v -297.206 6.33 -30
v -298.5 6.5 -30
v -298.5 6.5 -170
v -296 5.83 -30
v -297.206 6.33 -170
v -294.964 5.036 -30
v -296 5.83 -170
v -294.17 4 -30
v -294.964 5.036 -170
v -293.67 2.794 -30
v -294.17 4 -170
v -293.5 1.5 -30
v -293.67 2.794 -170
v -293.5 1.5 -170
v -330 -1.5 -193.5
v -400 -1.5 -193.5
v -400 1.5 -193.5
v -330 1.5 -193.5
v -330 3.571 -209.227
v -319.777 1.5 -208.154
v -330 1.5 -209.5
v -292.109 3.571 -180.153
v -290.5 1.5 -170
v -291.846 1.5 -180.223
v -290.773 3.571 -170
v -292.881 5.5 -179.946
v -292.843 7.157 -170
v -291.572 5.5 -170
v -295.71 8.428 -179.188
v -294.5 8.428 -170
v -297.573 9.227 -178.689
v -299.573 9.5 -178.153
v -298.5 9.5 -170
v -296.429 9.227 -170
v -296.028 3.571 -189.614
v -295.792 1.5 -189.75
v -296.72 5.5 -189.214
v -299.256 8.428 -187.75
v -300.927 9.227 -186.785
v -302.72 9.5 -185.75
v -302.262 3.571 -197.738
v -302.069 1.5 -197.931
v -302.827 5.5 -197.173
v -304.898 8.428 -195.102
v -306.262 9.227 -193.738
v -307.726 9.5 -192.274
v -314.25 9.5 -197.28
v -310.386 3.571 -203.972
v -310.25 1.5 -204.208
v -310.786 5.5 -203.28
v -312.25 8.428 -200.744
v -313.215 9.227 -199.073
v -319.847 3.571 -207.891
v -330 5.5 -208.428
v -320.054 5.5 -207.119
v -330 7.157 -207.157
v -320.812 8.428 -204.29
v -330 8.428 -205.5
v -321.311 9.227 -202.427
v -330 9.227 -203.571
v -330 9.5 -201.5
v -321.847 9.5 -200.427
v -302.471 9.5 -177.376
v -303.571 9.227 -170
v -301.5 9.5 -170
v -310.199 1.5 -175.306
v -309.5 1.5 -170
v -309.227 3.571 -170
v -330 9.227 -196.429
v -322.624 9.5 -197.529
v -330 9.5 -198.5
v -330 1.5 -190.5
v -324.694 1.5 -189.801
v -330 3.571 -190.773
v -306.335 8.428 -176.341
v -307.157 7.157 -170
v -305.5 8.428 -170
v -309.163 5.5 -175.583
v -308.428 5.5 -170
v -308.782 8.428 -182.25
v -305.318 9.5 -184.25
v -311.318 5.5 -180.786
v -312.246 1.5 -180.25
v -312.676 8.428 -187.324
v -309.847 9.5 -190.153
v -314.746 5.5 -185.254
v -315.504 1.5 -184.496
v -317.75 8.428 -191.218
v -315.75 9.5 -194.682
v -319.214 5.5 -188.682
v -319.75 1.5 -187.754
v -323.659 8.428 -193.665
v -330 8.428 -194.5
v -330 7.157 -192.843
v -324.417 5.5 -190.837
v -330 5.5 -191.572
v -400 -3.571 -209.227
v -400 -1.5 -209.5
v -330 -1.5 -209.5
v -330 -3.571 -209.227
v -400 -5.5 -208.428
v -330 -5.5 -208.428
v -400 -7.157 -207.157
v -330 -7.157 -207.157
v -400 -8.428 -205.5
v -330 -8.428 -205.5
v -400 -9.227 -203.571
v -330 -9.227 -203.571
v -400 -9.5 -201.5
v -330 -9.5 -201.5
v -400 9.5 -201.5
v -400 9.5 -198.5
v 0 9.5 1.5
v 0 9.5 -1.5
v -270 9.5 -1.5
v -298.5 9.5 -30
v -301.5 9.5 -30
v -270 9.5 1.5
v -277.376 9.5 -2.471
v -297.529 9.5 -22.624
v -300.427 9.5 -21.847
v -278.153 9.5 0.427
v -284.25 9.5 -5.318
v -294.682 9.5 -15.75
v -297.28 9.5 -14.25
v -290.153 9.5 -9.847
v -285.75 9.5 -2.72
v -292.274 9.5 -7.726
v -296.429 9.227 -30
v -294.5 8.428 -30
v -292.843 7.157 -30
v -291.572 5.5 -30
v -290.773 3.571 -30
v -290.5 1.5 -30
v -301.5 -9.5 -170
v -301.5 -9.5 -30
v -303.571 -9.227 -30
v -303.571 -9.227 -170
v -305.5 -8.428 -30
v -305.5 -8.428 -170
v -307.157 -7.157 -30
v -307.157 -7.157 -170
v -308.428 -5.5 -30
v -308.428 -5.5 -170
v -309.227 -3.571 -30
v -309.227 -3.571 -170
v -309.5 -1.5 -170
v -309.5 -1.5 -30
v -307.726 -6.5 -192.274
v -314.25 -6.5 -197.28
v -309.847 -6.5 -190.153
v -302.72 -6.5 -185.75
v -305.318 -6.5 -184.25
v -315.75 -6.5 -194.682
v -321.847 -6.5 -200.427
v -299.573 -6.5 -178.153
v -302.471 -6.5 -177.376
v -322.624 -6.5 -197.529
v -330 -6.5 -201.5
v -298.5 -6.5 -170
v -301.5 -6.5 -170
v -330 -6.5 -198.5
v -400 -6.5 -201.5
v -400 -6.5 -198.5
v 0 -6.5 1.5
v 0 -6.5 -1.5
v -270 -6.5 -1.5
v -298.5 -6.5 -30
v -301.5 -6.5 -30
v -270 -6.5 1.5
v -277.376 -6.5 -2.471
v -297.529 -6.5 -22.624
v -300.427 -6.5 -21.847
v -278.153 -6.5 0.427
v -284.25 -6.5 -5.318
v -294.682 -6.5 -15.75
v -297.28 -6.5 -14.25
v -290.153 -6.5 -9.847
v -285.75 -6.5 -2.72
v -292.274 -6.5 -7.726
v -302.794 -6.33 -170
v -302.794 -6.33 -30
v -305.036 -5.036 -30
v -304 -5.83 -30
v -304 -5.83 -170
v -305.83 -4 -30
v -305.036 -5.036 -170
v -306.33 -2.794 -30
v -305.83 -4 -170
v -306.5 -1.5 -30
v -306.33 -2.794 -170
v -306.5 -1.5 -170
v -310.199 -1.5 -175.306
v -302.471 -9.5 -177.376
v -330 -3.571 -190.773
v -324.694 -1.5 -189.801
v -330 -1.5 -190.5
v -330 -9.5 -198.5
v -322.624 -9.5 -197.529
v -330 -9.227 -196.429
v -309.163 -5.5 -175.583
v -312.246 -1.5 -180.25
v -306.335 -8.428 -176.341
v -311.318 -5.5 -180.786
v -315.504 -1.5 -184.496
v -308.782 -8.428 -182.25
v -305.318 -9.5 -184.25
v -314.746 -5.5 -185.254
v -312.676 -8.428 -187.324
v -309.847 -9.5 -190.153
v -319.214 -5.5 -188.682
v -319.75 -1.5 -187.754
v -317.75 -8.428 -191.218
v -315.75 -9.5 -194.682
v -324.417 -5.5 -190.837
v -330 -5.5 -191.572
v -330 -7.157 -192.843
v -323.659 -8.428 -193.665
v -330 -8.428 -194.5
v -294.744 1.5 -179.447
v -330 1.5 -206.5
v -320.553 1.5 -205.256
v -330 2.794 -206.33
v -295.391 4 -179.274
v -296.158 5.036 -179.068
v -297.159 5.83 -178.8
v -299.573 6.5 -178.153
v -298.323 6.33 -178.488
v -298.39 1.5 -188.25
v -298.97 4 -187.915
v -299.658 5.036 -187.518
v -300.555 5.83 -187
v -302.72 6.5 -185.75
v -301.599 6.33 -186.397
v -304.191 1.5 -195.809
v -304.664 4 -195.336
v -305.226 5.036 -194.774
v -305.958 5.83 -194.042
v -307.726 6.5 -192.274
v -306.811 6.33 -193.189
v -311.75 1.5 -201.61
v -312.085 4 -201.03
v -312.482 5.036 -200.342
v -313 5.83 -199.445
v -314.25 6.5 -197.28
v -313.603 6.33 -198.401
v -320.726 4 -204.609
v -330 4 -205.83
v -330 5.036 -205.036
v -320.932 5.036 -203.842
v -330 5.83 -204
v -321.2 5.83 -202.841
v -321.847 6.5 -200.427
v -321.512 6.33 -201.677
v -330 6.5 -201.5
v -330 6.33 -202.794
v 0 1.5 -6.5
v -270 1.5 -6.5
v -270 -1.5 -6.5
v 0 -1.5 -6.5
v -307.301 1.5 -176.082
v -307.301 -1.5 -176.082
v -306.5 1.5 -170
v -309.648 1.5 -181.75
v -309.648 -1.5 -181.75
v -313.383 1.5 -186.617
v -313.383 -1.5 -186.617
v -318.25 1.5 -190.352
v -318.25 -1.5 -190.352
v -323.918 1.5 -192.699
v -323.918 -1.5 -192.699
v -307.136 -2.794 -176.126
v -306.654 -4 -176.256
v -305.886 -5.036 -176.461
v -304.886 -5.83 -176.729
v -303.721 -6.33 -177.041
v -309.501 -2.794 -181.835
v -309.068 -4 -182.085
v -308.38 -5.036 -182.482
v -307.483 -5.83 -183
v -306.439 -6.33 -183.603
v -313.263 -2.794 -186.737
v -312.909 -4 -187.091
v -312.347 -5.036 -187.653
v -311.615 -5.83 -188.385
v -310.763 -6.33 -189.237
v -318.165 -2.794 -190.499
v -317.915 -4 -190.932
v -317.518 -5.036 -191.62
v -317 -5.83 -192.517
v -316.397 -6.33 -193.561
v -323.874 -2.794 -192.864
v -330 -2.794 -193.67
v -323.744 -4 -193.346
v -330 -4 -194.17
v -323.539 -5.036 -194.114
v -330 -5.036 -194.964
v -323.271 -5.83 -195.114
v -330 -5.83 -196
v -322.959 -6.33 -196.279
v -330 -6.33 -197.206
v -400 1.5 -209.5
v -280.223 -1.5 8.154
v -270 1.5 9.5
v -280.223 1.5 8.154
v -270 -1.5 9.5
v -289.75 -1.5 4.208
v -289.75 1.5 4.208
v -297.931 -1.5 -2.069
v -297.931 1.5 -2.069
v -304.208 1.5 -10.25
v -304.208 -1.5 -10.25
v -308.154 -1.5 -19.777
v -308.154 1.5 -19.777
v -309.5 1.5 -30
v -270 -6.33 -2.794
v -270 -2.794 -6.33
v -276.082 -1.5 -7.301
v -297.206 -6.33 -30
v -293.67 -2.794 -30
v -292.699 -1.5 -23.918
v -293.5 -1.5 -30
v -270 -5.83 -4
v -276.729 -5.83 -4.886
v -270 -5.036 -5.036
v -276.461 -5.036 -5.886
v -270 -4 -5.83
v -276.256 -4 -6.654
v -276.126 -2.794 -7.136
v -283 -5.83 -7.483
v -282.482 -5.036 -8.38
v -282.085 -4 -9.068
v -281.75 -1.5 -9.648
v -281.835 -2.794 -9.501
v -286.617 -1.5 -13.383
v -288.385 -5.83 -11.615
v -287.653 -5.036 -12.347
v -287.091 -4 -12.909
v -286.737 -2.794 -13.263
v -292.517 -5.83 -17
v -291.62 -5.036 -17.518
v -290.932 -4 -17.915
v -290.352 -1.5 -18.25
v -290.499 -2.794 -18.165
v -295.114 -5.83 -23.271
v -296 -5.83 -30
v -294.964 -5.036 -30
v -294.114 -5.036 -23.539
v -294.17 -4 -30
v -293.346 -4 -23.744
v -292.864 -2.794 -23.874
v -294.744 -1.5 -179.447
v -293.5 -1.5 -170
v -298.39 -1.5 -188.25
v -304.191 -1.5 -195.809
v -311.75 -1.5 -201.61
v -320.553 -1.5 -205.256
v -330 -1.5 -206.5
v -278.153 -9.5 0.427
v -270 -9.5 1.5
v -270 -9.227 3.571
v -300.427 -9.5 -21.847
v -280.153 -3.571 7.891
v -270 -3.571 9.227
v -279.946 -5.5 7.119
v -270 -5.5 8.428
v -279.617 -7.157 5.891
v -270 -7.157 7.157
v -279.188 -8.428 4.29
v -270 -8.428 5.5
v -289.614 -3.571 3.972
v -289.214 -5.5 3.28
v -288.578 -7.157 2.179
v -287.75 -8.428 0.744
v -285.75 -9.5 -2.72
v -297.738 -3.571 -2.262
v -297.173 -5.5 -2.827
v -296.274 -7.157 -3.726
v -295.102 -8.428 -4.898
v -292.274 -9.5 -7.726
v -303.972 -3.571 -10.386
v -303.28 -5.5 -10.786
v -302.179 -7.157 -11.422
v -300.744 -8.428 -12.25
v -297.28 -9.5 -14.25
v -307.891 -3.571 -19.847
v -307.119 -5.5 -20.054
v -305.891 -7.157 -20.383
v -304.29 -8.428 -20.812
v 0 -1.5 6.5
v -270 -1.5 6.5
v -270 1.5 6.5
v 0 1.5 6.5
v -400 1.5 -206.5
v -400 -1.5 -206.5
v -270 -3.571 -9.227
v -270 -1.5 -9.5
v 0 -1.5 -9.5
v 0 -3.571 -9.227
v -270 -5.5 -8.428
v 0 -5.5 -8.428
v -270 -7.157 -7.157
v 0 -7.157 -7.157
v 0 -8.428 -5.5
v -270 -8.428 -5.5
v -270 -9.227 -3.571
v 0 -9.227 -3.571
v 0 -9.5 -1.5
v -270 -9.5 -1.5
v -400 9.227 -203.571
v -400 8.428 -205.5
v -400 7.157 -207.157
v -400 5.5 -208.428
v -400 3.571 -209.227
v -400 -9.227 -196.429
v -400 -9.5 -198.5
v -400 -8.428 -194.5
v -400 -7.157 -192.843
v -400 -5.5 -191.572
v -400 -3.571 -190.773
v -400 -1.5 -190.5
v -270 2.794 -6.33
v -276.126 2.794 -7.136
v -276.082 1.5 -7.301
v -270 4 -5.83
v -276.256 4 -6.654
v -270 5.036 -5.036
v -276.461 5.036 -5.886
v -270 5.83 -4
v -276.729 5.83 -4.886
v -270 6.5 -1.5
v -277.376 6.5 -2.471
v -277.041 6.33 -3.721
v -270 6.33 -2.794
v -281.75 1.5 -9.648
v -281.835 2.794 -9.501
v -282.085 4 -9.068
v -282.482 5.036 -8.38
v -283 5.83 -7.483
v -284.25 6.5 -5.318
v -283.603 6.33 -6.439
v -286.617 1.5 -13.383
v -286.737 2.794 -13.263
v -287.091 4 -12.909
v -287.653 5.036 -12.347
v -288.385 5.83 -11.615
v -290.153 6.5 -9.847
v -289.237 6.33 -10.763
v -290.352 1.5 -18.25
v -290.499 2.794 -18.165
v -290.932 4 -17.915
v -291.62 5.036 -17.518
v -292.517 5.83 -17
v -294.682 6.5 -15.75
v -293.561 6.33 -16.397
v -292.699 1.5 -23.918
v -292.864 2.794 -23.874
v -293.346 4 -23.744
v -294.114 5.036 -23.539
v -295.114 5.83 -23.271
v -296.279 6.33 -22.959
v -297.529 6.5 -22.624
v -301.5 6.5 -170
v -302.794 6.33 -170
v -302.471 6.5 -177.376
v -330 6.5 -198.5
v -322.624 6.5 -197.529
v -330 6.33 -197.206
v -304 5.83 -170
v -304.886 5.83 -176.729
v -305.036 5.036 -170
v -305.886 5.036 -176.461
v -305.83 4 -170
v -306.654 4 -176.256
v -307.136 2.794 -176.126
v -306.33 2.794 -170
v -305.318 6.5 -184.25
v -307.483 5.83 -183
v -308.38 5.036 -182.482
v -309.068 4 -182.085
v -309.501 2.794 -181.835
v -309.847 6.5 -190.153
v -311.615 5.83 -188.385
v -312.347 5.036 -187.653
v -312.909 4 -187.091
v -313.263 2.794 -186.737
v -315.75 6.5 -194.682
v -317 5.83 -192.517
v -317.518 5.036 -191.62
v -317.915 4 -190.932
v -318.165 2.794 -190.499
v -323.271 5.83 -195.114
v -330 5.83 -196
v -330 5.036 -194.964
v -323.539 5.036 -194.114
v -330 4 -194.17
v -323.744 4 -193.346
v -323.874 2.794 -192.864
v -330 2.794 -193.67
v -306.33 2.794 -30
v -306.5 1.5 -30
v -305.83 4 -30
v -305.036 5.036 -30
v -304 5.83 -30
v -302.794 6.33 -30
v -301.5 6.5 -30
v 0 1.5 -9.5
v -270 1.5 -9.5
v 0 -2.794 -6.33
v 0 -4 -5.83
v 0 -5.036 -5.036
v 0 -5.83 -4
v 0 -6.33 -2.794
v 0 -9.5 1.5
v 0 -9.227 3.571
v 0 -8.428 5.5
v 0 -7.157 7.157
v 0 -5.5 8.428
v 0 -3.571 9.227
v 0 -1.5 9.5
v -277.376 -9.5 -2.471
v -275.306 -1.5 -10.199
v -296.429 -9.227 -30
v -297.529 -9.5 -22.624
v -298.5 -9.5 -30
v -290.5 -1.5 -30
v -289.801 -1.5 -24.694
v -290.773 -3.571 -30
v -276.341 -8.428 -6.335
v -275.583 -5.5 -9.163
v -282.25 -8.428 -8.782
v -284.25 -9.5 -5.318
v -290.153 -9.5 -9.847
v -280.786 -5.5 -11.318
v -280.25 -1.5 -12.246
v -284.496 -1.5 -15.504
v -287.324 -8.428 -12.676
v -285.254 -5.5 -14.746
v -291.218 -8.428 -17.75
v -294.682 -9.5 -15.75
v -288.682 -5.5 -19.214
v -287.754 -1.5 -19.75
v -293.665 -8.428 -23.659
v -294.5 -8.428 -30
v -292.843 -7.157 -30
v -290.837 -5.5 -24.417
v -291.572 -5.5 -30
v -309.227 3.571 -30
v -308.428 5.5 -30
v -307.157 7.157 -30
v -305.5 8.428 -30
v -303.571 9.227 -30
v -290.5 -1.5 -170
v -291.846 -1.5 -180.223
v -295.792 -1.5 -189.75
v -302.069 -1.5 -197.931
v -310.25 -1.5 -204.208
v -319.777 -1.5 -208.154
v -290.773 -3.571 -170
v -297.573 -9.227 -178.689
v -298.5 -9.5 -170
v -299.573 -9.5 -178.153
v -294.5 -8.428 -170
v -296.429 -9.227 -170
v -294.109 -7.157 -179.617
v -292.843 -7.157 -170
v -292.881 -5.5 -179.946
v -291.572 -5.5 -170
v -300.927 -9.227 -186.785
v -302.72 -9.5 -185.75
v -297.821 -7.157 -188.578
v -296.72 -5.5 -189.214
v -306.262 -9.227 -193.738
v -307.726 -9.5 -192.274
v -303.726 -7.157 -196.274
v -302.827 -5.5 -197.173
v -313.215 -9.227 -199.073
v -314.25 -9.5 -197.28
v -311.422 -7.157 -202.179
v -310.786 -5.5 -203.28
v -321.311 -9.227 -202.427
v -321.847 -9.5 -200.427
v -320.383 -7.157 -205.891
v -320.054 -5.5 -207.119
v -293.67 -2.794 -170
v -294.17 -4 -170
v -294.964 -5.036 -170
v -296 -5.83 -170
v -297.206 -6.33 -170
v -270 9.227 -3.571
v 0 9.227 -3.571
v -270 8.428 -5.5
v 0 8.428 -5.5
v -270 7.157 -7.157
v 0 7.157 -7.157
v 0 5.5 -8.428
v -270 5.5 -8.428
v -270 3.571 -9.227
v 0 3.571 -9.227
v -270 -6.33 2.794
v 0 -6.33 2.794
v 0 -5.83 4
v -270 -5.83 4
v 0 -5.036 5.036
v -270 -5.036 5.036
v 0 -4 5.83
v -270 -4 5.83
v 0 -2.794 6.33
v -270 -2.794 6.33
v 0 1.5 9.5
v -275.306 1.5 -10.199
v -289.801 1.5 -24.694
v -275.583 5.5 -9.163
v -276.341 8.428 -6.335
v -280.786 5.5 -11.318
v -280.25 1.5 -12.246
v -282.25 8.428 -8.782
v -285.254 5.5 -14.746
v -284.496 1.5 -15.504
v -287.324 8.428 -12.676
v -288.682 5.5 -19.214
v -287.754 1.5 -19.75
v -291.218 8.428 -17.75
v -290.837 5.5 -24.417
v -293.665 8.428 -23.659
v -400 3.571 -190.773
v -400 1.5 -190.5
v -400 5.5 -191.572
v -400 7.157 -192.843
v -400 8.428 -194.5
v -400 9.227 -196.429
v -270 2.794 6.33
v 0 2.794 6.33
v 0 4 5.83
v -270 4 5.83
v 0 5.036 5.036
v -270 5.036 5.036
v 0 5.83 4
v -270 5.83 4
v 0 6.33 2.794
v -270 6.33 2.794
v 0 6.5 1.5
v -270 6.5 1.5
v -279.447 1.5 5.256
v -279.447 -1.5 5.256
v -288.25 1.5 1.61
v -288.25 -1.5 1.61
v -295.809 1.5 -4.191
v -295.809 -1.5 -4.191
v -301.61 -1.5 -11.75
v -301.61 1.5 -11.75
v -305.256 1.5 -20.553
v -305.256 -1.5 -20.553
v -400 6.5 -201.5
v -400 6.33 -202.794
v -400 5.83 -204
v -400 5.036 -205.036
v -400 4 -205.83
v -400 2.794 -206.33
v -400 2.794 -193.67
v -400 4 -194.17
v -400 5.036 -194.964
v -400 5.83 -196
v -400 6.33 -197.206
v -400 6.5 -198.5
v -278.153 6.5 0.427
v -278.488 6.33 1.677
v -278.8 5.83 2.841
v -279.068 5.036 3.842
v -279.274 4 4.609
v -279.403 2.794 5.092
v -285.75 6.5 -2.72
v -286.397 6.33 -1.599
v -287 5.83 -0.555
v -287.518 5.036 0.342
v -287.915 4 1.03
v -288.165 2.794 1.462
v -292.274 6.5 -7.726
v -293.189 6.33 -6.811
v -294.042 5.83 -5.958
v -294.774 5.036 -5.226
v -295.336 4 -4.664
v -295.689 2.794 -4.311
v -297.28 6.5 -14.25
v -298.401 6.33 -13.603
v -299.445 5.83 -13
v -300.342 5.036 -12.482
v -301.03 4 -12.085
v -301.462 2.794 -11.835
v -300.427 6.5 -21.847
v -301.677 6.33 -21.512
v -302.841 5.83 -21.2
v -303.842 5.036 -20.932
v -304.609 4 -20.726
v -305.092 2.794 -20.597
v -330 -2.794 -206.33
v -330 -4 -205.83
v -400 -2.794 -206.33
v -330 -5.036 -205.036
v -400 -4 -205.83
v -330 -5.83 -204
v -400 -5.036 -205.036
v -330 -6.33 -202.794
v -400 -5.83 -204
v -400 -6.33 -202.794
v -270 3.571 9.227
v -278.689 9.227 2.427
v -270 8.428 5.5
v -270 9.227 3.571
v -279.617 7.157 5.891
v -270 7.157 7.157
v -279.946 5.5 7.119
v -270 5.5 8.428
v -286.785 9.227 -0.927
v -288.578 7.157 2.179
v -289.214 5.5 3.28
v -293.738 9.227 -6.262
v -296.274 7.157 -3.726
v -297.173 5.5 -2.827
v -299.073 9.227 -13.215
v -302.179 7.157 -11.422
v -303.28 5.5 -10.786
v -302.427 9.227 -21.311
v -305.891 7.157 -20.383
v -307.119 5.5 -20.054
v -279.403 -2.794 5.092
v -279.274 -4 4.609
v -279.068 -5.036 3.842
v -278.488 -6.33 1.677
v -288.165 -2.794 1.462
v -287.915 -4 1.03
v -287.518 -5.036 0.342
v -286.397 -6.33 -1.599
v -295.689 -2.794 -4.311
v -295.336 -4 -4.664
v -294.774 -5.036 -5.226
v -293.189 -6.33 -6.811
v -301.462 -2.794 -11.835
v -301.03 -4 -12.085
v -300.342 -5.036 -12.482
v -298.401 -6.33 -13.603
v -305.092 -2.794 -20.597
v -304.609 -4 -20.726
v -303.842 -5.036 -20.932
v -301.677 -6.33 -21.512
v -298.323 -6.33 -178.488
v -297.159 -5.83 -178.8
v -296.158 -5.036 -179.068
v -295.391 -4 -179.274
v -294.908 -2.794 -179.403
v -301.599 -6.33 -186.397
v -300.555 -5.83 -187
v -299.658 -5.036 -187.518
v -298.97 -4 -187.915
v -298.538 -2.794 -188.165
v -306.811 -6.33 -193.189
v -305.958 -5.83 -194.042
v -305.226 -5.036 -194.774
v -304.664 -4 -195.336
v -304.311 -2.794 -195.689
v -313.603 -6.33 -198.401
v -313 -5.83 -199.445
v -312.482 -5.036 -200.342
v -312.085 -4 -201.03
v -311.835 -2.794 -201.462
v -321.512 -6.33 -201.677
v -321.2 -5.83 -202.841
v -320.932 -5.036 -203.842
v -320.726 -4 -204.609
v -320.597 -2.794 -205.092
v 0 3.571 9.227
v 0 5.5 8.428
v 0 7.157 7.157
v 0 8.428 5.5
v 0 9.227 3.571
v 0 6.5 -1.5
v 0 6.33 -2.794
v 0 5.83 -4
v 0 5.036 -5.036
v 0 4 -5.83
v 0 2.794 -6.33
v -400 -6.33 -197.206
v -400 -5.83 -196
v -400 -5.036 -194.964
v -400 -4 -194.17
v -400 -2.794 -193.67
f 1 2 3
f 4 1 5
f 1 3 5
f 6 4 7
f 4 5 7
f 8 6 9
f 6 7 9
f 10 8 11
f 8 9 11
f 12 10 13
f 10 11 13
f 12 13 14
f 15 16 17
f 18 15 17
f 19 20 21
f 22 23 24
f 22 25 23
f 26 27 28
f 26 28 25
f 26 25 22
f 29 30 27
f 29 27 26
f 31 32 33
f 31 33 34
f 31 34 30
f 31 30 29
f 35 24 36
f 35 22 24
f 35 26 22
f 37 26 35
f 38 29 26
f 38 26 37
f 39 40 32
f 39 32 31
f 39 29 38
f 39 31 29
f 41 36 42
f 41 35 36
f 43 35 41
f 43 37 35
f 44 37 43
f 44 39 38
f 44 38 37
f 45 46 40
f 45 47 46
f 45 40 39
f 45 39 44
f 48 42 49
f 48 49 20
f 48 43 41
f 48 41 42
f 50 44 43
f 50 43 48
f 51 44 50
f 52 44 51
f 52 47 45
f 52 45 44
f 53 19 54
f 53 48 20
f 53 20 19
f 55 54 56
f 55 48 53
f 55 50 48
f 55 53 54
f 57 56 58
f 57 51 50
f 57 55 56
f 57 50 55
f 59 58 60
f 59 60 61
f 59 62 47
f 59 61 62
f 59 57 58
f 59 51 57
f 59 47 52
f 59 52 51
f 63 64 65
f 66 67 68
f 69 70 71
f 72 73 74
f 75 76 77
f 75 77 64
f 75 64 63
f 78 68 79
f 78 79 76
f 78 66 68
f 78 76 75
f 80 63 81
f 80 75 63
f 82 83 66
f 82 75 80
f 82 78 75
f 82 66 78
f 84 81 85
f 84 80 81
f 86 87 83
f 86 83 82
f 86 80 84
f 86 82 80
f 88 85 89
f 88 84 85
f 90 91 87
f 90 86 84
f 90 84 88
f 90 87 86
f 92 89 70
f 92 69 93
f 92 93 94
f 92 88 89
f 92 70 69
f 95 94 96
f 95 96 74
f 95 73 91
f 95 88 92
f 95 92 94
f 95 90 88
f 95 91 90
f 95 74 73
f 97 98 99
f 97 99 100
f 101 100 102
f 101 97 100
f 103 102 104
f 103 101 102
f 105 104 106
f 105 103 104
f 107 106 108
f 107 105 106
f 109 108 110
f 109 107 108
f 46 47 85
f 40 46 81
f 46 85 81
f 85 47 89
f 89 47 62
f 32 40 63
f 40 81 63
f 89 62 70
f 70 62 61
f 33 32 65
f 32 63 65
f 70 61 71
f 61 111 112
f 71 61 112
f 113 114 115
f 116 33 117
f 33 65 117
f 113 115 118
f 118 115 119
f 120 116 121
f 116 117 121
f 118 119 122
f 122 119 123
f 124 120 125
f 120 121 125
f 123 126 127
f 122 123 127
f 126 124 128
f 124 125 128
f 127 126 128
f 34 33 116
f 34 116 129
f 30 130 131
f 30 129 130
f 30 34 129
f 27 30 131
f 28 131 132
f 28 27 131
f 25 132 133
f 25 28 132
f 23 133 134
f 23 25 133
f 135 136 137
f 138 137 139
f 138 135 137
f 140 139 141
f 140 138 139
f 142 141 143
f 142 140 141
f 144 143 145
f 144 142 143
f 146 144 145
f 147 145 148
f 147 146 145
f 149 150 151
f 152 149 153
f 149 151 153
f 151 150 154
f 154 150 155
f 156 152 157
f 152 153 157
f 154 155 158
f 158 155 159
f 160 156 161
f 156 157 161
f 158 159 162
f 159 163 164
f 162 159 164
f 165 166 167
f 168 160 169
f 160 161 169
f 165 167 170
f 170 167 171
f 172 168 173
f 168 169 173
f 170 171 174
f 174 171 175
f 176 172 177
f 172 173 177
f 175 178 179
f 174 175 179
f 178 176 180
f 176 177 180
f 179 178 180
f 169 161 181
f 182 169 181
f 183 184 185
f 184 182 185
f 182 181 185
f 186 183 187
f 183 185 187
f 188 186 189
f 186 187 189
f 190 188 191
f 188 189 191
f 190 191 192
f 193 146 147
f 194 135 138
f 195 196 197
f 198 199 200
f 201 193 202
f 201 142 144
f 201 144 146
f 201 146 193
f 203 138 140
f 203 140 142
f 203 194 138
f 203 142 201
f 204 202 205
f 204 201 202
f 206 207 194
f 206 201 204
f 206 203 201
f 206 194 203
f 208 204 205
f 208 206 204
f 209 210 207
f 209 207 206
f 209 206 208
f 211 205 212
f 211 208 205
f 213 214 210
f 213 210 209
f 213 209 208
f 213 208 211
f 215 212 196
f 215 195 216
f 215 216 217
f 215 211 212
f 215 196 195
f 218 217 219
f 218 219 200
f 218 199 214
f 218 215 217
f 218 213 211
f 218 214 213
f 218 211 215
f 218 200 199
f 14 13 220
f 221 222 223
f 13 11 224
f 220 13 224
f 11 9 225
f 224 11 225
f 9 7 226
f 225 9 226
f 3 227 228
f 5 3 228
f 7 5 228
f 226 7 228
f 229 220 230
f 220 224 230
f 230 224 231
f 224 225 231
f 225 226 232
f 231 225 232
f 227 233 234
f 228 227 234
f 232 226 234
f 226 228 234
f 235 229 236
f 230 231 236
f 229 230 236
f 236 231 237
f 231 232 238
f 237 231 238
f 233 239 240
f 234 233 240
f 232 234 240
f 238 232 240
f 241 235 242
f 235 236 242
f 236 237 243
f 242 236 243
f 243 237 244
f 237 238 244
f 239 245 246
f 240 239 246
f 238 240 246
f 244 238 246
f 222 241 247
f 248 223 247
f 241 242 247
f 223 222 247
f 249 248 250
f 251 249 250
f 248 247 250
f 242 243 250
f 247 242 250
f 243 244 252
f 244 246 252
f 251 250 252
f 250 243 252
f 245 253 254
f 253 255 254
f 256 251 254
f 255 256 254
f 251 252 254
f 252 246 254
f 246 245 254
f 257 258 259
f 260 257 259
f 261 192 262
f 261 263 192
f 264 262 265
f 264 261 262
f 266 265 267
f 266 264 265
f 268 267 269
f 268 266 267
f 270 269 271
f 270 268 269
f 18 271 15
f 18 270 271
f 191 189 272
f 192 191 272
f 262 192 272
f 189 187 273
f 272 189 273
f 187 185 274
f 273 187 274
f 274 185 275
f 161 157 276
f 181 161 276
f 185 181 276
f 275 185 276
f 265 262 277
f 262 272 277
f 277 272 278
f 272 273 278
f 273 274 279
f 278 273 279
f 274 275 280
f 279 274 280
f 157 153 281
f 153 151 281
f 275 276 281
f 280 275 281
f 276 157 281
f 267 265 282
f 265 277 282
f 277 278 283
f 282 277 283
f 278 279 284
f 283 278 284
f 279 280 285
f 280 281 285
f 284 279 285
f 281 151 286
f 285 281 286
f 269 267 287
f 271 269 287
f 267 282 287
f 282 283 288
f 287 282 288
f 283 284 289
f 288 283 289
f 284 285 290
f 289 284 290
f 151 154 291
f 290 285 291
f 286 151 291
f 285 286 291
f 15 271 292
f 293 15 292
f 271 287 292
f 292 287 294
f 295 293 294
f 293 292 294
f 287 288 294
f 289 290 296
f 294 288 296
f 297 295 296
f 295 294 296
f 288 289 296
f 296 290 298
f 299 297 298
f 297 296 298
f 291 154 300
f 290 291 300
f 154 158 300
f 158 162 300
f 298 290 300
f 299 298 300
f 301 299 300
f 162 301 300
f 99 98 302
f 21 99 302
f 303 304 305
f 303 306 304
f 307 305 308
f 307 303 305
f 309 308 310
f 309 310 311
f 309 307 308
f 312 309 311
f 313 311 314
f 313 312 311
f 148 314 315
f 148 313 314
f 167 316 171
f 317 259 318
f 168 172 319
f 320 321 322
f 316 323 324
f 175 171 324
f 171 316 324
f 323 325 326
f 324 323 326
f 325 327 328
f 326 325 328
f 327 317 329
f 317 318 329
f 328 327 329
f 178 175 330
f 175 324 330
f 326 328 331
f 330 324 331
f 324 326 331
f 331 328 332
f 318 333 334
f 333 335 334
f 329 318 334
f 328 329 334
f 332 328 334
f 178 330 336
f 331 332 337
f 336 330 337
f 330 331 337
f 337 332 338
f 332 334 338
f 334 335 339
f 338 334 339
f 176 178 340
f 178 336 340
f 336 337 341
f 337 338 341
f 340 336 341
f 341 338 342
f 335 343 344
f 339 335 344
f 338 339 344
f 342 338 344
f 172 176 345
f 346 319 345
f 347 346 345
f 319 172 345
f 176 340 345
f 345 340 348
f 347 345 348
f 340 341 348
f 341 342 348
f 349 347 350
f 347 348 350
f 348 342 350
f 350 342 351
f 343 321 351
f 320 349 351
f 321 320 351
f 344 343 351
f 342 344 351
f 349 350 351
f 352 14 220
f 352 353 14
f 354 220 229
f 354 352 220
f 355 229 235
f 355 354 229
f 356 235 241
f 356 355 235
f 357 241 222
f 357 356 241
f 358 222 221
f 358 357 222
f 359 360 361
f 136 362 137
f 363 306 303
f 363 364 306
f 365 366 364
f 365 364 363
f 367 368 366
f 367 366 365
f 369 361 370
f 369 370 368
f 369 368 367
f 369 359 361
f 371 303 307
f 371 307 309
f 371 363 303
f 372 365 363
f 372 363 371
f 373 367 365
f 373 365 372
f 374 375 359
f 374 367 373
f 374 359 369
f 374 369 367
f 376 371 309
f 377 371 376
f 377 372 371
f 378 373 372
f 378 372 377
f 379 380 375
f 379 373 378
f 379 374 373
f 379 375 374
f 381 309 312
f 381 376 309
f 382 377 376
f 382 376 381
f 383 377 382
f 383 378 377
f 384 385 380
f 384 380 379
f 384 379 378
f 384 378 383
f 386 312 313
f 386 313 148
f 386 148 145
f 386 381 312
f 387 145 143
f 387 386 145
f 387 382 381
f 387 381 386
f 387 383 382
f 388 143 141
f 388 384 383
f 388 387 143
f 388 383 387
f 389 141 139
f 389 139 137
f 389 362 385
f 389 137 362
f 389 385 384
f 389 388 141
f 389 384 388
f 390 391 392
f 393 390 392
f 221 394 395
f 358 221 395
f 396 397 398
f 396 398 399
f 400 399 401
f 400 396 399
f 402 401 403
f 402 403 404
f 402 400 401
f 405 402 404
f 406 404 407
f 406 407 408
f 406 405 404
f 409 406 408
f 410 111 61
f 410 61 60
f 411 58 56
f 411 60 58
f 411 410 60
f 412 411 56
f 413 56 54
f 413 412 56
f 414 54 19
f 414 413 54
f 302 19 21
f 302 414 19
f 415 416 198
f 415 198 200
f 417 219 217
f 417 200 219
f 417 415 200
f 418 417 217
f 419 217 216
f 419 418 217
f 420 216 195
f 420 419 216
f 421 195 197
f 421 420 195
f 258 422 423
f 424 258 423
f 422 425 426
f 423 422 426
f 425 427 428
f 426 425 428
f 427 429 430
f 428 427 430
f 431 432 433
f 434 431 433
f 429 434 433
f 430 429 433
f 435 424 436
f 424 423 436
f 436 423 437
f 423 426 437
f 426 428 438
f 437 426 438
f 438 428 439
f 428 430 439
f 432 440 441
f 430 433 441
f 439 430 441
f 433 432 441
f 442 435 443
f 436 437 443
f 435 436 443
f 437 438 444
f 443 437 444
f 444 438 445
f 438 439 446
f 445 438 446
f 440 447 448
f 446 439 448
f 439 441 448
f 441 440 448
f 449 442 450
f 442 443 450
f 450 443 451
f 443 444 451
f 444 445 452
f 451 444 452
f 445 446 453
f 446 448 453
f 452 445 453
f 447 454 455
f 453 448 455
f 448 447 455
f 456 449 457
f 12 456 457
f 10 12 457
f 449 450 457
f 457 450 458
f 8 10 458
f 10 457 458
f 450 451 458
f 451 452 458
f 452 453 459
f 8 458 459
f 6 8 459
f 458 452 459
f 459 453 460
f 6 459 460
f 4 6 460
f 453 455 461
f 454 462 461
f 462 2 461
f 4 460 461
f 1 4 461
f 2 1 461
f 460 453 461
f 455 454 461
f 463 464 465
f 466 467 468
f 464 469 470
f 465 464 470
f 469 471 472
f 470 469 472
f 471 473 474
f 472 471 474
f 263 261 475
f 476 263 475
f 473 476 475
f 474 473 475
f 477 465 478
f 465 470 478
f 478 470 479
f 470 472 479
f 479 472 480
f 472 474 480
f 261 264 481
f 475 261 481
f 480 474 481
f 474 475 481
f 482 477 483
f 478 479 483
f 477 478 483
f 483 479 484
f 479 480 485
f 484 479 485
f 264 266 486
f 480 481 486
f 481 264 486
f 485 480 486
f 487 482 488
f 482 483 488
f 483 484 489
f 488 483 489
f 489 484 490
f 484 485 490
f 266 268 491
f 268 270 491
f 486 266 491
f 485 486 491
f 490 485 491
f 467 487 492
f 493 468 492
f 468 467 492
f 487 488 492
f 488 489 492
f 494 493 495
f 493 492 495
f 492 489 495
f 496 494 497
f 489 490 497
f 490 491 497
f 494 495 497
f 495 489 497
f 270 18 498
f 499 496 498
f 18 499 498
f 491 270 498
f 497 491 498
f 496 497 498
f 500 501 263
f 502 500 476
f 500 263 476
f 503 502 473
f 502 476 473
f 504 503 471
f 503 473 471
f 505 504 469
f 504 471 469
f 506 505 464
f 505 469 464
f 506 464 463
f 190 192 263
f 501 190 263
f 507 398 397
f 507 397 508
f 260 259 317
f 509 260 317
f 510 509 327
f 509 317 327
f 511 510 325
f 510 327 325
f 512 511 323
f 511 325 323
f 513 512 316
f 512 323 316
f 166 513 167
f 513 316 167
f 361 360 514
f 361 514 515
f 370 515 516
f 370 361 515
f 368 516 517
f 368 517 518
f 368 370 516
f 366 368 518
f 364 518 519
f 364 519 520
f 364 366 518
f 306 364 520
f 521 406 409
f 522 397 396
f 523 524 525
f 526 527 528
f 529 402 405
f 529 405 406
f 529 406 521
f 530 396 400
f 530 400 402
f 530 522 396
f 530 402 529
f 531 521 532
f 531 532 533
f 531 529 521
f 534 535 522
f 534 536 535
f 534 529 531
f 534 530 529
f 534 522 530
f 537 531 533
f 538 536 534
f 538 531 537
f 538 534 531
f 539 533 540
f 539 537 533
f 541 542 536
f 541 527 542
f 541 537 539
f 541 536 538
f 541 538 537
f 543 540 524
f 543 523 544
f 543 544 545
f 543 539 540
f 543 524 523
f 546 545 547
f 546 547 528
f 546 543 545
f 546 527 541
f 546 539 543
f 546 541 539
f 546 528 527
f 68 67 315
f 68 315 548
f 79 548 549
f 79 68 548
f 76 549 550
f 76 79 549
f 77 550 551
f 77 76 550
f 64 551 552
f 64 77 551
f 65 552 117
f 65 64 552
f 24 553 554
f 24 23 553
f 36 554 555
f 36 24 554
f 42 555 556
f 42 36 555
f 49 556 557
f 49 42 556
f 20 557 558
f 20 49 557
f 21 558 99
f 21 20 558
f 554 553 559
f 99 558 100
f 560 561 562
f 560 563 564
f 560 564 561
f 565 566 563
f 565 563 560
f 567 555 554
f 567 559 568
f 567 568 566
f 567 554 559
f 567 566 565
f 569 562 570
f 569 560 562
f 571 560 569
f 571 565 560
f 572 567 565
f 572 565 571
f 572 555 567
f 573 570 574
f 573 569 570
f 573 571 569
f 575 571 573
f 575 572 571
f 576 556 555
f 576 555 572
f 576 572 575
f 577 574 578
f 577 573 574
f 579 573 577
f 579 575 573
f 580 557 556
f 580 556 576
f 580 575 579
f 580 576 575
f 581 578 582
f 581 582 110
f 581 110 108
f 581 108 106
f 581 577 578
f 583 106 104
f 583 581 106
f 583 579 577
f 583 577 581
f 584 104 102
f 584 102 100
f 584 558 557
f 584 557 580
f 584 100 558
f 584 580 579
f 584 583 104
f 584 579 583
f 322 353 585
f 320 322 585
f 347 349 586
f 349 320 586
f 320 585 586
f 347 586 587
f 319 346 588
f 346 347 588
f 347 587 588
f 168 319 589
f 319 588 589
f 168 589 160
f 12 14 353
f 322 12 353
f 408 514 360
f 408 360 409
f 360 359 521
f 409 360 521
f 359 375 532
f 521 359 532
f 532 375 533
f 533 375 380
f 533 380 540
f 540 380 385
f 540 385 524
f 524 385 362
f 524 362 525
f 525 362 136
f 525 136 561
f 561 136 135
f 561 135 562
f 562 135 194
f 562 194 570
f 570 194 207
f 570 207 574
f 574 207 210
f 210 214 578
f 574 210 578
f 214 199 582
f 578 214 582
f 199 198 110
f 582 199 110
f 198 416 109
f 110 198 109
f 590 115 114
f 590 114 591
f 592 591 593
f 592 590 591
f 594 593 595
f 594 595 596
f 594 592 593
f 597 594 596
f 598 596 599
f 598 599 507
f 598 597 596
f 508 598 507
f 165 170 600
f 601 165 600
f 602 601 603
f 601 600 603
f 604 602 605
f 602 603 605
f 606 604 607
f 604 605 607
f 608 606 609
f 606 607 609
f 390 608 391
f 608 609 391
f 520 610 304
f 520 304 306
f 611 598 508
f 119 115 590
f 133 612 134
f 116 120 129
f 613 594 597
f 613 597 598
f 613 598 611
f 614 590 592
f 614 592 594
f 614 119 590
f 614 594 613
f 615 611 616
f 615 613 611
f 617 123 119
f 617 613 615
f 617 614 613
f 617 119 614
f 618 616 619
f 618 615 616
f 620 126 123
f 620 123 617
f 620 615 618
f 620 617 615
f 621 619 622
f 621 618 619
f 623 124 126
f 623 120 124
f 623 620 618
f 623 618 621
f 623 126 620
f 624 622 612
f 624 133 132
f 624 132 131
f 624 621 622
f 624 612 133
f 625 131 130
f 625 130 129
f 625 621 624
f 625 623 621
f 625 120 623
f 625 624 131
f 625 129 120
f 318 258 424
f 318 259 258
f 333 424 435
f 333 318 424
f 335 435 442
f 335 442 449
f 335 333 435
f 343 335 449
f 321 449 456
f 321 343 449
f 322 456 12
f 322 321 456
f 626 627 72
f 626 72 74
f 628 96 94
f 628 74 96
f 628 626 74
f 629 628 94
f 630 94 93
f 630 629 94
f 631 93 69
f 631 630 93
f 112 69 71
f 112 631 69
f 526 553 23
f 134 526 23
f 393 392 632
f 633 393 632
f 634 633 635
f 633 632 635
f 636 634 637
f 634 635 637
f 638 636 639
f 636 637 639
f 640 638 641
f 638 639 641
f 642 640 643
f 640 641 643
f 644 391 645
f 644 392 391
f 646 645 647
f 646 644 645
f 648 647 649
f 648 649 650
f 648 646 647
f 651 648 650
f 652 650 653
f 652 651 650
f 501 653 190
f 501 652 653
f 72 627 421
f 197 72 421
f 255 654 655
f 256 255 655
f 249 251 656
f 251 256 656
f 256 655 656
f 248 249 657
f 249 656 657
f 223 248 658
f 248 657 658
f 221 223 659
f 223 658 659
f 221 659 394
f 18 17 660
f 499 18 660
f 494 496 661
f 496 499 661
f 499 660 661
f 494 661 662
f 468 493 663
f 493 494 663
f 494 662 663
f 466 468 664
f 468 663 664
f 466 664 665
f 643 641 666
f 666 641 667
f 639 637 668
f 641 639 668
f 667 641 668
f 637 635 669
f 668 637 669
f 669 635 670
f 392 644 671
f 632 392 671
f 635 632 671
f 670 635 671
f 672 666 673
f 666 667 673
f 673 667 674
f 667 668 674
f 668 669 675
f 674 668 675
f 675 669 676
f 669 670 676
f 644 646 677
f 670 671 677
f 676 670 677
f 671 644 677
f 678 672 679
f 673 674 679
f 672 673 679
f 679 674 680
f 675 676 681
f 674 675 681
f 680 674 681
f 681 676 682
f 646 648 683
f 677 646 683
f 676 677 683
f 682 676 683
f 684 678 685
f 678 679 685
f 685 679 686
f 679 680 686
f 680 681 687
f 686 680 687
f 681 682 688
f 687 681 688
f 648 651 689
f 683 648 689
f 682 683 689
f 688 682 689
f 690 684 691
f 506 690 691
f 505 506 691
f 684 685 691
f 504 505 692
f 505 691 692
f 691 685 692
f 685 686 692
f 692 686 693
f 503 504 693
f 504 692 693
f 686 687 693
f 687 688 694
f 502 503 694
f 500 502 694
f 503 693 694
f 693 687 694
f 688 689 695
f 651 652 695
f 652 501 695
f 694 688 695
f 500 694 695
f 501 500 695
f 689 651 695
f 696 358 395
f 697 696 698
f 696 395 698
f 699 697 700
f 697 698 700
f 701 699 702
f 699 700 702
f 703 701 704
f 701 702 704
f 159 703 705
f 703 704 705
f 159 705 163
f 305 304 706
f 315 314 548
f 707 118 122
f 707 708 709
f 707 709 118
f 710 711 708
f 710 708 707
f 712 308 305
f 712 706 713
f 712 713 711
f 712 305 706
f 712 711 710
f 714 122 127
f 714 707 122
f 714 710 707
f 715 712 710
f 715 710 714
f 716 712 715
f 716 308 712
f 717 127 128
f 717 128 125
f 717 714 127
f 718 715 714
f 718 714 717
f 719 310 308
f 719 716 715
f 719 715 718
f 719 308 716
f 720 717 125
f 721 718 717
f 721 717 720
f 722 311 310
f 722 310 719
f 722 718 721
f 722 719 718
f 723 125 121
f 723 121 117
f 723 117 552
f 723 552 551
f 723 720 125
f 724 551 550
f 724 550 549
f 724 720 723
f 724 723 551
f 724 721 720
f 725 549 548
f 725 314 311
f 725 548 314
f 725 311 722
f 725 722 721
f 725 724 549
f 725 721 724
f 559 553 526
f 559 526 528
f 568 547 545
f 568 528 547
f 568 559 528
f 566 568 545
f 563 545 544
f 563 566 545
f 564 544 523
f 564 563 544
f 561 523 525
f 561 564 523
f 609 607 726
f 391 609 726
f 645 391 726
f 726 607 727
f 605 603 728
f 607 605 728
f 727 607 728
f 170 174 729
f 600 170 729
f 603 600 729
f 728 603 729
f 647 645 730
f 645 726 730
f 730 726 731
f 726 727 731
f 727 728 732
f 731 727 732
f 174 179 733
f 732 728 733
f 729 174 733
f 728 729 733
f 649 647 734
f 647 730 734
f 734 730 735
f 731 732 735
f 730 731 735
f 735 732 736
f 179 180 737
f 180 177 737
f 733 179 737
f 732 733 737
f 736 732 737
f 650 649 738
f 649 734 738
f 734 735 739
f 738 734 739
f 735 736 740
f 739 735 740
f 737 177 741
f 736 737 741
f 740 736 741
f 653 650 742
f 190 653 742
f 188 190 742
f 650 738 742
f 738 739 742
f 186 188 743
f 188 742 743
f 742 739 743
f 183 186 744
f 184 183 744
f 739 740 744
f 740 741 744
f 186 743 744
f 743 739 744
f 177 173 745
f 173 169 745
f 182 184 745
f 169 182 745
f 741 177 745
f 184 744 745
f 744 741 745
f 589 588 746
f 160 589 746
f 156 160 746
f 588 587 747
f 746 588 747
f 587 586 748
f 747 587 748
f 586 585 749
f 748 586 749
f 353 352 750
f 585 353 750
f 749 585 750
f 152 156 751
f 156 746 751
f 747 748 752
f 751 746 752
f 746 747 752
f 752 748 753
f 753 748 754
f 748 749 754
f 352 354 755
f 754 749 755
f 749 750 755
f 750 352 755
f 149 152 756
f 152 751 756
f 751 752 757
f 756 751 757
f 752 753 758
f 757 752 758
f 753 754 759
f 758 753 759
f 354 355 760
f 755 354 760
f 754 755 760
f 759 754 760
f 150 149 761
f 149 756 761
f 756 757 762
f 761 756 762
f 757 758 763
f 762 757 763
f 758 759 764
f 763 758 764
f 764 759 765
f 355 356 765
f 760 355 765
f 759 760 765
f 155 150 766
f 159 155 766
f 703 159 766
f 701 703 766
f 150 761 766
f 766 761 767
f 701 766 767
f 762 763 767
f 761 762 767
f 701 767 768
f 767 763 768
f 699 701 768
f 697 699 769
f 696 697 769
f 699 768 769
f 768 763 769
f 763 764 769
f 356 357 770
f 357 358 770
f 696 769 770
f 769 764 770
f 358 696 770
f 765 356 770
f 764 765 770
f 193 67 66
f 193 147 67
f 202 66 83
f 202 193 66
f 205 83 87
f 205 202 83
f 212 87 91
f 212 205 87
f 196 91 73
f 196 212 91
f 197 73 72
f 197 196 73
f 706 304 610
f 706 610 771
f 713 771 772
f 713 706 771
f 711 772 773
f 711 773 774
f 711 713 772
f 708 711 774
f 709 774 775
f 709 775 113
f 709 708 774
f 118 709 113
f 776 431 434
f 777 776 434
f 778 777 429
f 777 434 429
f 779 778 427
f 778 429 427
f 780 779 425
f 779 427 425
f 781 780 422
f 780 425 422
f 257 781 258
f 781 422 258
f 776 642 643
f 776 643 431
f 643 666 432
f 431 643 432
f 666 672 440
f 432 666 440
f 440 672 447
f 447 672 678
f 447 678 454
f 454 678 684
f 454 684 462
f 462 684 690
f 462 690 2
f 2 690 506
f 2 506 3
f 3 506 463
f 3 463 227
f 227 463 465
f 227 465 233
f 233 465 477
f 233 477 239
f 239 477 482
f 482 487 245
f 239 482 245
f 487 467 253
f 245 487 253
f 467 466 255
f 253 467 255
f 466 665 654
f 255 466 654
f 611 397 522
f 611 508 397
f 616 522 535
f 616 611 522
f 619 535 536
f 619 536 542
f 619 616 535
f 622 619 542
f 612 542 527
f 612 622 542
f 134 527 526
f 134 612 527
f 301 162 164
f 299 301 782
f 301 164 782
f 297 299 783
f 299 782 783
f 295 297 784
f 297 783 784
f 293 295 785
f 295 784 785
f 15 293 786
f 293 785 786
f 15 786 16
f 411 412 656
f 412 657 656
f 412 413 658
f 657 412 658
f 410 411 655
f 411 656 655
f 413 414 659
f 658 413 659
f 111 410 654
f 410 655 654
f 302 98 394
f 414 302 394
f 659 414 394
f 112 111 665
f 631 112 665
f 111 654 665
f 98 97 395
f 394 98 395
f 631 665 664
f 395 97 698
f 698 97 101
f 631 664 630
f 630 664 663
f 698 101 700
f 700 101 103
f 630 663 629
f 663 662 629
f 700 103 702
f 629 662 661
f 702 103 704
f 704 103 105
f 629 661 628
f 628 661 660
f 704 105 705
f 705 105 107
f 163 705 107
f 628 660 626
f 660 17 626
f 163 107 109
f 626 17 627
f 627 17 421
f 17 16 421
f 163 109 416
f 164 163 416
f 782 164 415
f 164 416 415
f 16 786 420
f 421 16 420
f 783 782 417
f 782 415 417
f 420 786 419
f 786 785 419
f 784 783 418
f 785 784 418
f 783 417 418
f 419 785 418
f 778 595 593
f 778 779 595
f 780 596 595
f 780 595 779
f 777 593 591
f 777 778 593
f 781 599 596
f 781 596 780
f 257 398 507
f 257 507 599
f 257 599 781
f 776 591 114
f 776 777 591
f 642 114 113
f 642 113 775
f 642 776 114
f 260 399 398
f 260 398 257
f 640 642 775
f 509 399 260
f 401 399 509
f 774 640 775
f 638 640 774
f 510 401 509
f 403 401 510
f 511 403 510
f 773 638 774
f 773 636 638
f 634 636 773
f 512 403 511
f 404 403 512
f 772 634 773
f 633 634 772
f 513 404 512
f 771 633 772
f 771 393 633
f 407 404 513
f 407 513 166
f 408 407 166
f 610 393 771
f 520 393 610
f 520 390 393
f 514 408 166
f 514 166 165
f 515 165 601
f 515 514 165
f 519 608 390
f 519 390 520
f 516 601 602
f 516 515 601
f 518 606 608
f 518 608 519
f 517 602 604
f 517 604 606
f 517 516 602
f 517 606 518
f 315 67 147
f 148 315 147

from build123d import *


with BuildPart() as part:
    # Sweep-Thin1: sweep along a path in Sketch1
    with BuildLine(Plane(origin=(0, 0, 0), x_dir=(1, 0, 0), z_dir=(0, 1, 0))) as sweep_thin1_path:
        Line((0, 0), (-270, 0))
        ThreePointArc((-270, 0), (-291.213203436, 8.786796564), (-300, 30))
        Line((-300, 30), (-300, 170))
        ThreePointArc((-300, 170), (-308.786796564, 191.213203436), (-330, 200))
        Line((-330, 200), (-400, 200))
    # Sketch2 → Sweep-Thin1 (sweep)
    with BuildSketch(Plane(origin=(0, 0, 0), x_dir=(0, 0, -1), z_dir=(1, 0, 0))):
        with BuildLine():
            Line((1.5, 9.5), (-1.5, 9.5))
            ThreePointArc((-1.5, 9.5), (-7.156854249, 7.156854249), (-9.5, 1.5))
            Line((-9.5, 1.5), (-9.5, -1.5))
            ThreePointArc((-9.5, -1.5), (-7.156854249, -7.156854249), (-1.5, -9.5))
            Line((-1.5, -9.5), (1.5, -9.5))
            ThreePointArc((1.5, -9.5), (7.156854249, -7.156854249), (9.5, -1.5))
            Line((9.5, -1.5), (9.5, 1.5))
            ThreePointArc((9.5, 1.5), (7.156854249, 7.156854249), (1.5, 9.5))
        make_face()
        with BuildLine():
            Line((1.5, 6.5), (-1.5, 6.5))
            ThreePointArc((-1.5, 6.5), (-5.035533906, 5.035533906), (-6.5, 1.5))
            Line((-6.5, 1.5), (-6.5, -1.5))
            ThreePointArc((-6.5, -1.5), (-5.035533906, -5.035533906), (-1.5, -6.5))
            Line((-1.5, -6.5), (1.5, -6.5))
            ThreePointArc((1.5, -6.5), (5.035533906, -5.035533906), (6.5, -1.5))
            Line((6.5, -1.5), (6.5, 1.5))
            ThreePointArc((6.5, 1.5), (5.035533906, 5.035533906), (1.5, 6.5))
        make_face(mode=Mode.SUBTRACT)
    sweep(path=sweep_thin1_path.line)


solid = part.part
